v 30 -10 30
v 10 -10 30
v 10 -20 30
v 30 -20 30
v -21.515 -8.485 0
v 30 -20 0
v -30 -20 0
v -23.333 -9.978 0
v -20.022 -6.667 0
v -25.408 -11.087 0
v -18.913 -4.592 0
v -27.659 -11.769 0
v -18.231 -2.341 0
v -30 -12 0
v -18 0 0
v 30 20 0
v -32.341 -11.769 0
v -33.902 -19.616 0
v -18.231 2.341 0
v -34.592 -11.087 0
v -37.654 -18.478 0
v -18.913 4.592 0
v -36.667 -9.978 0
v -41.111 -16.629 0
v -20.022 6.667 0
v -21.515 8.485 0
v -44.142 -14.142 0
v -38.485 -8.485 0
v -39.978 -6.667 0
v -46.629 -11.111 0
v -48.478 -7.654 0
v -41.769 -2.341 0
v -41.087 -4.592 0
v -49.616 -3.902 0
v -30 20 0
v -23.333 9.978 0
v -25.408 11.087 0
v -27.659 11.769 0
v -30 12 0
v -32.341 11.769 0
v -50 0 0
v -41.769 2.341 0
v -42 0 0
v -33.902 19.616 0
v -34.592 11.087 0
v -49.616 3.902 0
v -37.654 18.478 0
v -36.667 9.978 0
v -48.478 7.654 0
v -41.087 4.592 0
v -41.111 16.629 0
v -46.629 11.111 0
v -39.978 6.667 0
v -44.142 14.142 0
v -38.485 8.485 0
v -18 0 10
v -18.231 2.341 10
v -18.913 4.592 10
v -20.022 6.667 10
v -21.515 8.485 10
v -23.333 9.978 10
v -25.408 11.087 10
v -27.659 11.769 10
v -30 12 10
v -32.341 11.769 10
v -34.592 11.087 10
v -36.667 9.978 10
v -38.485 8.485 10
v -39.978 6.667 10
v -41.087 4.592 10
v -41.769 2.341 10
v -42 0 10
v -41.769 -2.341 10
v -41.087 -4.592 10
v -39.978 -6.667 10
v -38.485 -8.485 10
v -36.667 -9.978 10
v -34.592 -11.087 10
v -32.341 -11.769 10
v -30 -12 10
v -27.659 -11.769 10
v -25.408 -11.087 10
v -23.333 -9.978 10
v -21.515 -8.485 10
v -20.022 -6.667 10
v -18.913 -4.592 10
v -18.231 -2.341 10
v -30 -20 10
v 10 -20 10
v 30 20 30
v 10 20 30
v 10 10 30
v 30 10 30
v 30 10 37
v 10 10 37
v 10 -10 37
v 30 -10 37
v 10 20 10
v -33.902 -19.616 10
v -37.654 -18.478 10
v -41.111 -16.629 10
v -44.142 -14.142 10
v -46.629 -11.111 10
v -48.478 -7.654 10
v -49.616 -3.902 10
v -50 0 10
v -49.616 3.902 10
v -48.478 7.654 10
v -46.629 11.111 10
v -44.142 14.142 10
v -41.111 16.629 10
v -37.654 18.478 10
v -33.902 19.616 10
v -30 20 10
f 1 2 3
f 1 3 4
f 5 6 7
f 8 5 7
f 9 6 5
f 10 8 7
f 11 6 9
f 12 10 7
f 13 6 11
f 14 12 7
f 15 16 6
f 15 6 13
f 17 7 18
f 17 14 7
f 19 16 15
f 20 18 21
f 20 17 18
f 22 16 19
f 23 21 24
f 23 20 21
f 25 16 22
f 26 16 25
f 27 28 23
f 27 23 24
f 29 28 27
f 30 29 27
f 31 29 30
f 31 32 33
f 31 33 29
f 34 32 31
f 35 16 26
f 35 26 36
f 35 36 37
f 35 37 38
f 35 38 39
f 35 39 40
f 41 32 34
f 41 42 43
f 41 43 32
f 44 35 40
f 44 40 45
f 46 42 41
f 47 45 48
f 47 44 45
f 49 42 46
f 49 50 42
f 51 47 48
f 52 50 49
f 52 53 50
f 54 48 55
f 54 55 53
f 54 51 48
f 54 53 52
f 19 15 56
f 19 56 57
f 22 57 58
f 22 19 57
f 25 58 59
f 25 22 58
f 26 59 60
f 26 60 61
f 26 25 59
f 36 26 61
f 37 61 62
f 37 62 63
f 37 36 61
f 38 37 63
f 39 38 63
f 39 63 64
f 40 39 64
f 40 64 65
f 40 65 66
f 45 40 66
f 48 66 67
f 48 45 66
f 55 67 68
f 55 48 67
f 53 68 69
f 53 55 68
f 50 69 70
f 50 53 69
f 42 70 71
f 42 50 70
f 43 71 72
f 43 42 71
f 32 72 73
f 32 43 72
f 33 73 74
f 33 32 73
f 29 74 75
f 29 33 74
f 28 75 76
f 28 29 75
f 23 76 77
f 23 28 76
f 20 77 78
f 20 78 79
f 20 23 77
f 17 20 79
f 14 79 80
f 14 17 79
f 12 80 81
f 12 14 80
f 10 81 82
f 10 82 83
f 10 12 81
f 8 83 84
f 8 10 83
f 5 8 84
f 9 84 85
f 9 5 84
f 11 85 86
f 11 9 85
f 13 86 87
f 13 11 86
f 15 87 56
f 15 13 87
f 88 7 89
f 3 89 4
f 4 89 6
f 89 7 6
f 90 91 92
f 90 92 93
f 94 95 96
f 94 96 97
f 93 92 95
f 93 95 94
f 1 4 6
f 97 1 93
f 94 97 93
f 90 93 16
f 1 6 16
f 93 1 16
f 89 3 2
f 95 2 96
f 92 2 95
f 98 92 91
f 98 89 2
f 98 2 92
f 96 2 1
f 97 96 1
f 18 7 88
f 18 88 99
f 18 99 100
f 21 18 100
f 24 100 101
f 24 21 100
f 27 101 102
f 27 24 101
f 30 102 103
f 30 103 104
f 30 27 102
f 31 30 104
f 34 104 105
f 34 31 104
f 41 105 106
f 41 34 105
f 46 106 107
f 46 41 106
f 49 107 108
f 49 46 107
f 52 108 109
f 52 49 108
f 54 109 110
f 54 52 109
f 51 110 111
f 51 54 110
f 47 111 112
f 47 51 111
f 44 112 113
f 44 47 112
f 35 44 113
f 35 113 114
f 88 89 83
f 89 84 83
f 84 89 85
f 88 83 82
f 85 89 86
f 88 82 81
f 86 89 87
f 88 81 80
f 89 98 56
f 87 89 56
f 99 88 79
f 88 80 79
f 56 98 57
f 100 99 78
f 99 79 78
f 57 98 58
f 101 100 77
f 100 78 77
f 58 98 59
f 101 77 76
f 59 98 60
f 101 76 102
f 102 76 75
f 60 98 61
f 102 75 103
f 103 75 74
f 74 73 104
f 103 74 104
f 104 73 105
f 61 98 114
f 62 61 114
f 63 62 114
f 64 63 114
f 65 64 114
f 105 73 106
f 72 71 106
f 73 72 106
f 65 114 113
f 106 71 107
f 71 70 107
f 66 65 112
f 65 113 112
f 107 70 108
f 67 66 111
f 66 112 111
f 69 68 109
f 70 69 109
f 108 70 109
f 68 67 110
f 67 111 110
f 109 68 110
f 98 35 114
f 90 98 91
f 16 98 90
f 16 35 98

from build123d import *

# Parameters (mm, degrees)
SKETCH1_R           = 12
BOSS_EXTRUDE1_DEPTH = 10
SKETCH2_W           = 20
SKETCH2_H           = 40
BOSS_EXTRUDE2_DEPTH = 20
SKETCH3_W           = 20
SKETCH3_H           = 20
BOSS_EXTRUDE3_DEPTH = 7


with BuildPart() as part:
    # Sketch1 → Boss-Extrude1 (new body)
    with BuildSketch(Plane.XY):
        with BuildLine():
            Line((30, -20), (-30, -20))
            ThreePointArc((-30, -20), (-50, 0), (-30, 20))
            Line((-30, 20), (30, 20))
            Line((30, 20), (30, -20))
        make_face()
        with Locations((-30, 0)):
            Circle(SKETCH1_R, mode=Mode.SUBTRACT)
    extrude(amount=BOSS_EXTRUDE1_DEPTH)

    # Sketch2 → Boss-Extrude2 (add)
    with BuildSketch(Plane.XY.offset(10)):
        with Locations((20, 0)):
            Rectangle(SKETCH2_W, SKETCH2_H)
    extrude(amount=BOSS_EXTRUDE2_DEPTH)

    # Sketch3 → Boss-Extrude3 (add)
    with BuildSketch(Plane.XY.offset(30)):
        with Locations((20, 0)):
            Rectangle(SKETCH3_W, SKETCH3_H)
    extrude(amount=BOSS_EXTRUDE3_DEPTH)


solid = part.part
